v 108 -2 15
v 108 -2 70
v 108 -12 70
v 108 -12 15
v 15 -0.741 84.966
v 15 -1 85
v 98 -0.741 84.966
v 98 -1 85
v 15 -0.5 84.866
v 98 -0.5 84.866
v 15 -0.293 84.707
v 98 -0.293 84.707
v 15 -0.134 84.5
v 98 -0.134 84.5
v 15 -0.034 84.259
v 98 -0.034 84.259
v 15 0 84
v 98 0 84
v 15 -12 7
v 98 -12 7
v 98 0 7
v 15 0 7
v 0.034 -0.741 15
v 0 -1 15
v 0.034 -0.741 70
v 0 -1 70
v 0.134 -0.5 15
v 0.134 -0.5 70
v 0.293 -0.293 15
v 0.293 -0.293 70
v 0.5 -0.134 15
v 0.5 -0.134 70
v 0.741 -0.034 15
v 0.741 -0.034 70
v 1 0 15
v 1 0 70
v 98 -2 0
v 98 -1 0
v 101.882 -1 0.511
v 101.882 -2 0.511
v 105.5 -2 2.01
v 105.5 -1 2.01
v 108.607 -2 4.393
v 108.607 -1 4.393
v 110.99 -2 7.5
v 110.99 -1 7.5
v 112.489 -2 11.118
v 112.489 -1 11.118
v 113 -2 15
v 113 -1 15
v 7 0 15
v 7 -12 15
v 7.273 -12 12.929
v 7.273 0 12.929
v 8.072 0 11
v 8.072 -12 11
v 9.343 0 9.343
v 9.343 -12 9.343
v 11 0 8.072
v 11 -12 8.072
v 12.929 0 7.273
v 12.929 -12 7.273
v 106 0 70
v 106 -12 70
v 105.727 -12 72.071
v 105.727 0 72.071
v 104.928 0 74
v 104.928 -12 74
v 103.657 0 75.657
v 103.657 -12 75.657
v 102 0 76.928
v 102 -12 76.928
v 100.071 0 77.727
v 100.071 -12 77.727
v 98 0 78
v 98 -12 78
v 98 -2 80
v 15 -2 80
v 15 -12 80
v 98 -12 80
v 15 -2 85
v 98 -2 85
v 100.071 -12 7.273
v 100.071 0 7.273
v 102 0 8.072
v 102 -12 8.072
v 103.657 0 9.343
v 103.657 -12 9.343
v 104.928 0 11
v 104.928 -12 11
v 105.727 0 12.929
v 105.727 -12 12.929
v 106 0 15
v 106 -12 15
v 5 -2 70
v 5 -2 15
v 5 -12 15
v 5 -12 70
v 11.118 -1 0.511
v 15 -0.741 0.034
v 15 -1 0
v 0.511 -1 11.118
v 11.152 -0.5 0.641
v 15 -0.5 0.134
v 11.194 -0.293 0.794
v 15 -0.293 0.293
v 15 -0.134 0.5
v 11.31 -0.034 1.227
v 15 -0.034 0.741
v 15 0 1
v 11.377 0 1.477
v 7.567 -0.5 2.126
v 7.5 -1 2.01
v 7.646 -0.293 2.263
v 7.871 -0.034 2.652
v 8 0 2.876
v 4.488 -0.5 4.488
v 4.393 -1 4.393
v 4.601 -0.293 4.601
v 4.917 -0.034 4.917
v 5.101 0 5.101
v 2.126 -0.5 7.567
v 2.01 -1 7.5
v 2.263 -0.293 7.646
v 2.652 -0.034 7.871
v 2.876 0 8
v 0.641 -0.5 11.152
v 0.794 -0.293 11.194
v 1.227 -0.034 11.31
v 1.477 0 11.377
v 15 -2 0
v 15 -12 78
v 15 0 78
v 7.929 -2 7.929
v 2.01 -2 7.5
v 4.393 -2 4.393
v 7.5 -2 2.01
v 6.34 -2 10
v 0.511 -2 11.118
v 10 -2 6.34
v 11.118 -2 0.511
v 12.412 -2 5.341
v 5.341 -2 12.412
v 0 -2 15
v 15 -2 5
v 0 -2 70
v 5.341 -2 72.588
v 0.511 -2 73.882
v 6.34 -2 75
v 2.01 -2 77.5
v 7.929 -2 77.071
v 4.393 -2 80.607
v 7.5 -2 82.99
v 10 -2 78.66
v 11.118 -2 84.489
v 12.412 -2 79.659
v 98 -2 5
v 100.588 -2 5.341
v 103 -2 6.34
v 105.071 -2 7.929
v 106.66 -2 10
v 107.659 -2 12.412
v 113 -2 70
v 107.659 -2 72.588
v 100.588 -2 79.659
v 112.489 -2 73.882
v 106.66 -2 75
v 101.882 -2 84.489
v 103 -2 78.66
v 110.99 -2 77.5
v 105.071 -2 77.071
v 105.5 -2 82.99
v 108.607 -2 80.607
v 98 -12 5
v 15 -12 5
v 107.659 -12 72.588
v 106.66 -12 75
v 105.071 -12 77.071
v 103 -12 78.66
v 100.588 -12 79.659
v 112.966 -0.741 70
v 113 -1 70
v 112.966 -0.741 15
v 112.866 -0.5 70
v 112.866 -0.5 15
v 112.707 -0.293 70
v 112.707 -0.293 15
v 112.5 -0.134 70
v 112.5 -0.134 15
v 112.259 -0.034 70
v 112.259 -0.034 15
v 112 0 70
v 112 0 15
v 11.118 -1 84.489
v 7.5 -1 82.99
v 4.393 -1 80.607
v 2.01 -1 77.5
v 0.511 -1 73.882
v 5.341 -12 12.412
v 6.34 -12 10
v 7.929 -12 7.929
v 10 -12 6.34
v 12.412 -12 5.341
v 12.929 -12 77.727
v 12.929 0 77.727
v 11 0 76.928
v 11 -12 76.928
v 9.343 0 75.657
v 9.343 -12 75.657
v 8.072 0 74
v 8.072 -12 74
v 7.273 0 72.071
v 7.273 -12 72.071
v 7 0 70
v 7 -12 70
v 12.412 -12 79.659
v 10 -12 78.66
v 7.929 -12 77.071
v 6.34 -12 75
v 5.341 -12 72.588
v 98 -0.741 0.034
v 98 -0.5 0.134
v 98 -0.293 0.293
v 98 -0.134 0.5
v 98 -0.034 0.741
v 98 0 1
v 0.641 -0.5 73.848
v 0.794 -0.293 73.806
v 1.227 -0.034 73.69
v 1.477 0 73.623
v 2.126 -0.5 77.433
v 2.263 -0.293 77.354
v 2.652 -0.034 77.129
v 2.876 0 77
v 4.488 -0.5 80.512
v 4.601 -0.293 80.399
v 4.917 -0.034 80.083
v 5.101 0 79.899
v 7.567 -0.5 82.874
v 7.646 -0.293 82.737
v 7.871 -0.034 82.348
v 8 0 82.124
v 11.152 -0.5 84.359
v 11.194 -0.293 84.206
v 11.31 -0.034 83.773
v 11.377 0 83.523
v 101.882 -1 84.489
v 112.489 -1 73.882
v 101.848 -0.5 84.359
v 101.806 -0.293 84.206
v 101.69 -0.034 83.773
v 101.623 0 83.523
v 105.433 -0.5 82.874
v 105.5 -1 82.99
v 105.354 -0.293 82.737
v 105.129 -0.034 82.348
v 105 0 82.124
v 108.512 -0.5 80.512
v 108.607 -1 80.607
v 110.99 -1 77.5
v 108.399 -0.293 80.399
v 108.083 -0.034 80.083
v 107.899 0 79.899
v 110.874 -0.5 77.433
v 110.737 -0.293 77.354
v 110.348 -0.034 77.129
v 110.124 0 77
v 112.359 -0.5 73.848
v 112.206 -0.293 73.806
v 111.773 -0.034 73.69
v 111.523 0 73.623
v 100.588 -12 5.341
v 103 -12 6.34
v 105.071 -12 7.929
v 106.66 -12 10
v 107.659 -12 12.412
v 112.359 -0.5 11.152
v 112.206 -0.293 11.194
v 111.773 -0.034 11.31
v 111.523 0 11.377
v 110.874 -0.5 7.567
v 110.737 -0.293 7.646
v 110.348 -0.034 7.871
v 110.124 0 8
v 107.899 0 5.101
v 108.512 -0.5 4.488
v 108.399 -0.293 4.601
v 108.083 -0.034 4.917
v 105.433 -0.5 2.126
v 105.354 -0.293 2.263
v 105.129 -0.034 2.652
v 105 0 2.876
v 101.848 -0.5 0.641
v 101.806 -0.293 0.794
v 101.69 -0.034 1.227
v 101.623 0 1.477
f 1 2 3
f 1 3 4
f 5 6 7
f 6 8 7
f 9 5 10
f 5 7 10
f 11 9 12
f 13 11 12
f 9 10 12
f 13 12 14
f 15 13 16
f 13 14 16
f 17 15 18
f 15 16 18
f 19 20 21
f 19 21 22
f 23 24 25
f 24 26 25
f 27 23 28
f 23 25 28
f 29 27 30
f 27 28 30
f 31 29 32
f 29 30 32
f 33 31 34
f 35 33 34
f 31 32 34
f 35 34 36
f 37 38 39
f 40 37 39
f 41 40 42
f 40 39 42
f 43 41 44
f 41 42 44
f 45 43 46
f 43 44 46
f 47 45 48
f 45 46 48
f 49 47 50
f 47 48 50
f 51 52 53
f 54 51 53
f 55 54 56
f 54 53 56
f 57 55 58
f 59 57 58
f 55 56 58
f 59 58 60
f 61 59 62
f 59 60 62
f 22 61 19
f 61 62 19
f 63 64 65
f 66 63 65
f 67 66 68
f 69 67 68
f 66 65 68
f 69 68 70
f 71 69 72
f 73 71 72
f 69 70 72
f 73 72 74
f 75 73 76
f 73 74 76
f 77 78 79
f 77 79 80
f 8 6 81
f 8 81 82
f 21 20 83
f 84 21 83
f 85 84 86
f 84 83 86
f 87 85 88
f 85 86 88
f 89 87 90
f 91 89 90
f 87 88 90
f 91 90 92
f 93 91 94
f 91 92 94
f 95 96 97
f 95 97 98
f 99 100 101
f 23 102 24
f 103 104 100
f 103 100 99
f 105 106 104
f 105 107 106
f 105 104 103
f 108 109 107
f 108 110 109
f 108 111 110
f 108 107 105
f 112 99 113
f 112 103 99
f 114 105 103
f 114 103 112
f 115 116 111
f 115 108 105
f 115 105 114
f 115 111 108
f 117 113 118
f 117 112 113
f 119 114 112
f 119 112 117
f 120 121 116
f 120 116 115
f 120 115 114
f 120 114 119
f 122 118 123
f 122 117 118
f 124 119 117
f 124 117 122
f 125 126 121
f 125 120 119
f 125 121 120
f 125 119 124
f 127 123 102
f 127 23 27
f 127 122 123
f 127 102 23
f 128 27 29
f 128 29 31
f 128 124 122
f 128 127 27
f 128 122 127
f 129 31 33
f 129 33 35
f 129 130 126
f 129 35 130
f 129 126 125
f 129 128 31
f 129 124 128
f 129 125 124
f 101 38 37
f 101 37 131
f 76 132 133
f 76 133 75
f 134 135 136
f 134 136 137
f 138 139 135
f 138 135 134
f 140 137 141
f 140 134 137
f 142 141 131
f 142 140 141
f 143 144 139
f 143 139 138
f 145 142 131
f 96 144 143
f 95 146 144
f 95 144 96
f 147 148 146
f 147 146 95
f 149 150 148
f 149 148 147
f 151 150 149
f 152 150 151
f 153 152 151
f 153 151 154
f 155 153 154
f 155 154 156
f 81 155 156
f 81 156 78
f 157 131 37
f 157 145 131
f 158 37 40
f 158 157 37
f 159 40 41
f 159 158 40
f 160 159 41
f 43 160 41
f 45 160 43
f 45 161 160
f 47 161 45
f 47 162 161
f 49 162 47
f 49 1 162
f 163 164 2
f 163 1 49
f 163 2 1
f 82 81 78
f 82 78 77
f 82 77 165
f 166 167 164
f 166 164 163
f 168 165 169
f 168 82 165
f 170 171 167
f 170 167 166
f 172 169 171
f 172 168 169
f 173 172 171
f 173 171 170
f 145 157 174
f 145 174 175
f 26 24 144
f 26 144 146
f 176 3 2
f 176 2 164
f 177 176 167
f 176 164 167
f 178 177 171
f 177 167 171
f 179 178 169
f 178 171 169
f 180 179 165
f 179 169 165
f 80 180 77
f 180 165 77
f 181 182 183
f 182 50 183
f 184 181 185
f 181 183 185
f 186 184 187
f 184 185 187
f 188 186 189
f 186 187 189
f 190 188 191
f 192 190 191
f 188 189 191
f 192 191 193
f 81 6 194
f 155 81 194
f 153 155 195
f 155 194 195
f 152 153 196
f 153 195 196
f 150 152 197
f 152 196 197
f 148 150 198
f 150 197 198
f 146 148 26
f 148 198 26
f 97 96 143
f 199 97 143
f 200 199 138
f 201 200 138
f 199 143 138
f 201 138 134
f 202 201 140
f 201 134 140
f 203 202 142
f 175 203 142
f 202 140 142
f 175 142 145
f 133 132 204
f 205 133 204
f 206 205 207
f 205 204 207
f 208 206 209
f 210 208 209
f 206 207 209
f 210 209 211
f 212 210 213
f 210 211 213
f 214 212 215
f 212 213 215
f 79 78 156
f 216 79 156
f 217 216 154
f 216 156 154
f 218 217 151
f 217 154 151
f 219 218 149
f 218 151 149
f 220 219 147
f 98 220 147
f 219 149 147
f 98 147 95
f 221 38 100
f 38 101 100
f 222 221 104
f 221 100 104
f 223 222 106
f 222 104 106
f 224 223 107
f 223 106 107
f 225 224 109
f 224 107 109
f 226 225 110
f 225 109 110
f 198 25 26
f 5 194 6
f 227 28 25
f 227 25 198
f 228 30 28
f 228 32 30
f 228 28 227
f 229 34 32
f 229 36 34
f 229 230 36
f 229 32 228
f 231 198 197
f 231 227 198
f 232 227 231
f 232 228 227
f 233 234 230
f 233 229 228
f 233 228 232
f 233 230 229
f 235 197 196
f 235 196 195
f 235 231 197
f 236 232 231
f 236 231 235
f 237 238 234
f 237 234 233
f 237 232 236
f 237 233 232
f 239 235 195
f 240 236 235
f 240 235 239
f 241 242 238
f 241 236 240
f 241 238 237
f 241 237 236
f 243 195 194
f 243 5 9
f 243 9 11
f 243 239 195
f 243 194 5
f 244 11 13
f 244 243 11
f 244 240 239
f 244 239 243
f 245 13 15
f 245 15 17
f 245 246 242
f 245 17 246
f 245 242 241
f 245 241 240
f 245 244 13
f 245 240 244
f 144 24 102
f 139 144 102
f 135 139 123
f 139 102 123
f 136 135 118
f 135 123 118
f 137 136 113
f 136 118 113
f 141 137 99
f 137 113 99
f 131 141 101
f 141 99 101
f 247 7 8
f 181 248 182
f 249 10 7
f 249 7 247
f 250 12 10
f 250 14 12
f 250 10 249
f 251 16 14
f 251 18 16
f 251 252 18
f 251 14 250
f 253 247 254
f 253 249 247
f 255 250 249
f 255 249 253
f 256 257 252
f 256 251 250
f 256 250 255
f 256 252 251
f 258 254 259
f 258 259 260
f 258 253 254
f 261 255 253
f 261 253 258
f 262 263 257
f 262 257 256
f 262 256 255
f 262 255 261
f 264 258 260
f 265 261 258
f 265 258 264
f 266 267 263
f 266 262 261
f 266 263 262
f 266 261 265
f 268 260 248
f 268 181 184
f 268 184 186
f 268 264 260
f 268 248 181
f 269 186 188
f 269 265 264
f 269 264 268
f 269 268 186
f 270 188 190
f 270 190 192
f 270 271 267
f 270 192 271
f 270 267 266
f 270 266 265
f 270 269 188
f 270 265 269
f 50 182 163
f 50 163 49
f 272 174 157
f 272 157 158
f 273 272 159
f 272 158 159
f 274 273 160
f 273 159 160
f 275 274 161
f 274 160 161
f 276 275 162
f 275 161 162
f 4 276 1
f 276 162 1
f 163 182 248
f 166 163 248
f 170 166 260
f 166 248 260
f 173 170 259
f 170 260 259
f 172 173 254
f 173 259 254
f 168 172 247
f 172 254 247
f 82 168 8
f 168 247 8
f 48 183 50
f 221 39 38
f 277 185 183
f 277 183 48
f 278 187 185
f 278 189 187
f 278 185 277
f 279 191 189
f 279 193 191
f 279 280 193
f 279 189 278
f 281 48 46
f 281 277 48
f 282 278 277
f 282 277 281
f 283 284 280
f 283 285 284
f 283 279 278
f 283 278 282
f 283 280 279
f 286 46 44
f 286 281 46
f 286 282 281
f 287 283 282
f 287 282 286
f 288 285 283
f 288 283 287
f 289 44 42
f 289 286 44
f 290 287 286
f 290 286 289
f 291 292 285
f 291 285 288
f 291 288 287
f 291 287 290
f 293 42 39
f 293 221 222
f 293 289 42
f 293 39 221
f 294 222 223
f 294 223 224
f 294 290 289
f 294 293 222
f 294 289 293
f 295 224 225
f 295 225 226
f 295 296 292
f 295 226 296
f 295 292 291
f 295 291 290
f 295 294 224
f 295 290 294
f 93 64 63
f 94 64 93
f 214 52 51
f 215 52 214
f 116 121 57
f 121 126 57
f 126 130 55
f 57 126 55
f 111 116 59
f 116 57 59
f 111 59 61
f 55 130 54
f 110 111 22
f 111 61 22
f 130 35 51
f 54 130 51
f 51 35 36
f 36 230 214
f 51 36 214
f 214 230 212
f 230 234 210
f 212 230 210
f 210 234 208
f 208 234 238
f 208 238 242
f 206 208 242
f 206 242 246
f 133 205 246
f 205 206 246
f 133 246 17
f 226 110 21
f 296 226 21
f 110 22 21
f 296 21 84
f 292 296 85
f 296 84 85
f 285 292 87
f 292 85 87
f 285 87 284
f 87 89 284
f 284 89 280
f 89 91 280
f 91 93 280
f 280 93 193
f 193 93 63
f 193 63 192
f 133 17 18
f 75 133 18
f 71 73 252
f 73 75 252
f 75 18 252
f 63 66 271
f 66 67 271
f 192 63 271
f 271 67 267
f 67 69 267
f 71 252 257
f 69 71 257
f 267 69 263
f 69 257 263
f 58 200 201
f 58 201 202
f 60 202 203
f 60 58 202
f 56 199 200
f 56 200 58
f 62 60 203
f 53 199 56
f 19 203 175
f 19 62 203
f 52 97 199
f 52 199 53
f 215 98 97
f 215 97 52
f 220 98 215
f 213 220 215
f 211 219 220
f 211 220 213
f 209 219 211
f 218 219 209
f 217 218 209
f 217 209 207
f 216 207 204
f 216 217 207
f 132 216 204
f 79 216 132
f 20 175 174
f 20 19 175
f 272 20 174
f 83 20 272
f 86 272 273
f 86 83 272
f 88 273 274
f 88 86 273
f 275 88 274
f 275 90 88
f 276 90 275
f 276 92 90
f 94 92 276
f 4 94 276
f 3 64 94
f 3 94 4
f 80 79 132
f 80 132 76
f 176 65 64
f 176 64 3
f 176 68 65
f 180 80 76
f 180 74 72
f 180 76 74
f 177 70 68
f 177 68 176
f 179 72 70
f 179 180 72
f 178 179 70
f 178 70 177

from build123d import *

# Parameters (mm, degrees)
PAD_DEPTH    = 2
PAD001_DEPTH = 10
POCKET_DEPTH = 12.001
FILLET_R     = 1


with BuildPart() as part:
    # Sketch → Pad (new body)
    with BuildSketch(Plane.XZ):
        with BuildLine():
            ThreePointArc((15, 85), (4.393398, 80.606602), (0, 70))
            Line((0, 15), (0, 70))
            ThreePointArc((0, 15), (4.393398, 4.393398), (15, 0))
            Line((98, 0), (15, 0))
            ThreePointArc((98, 0), (108.606602, 4.393398), (113, 15))
            Line((113, 70), (113, 15))
            ThreePointArc((113, 70), (108.606602, 80.606602), (98, 85))
            Line((15, 85), (98, 85))
        make_face()
    extrude(amount=PAD_DEPTH)

    # Sketch001 (on Face10 of Pad) → Pad001 (join)
    with BuildSketch(Plane.XZ.offset(2)):
        with BuildLine():
            ThreePointArc((15, 80), (7.928932, 77.071068), (5, 70))
            Line((5, 15), (5, 70))
            ThreePointArc((5, 15), (7.928932, 7.928932), (15, 5))
            Line((98, 5), (15, 5))
            ThreePointArc((98, 5), (105.071068, 7.928932), (108, 15))
            Line((108, 70), (108, 15))
            ThreePointArc((108, 70), (105.071068, 77.071068), (98, 80))
            Line((15, 80), (98, 80))
        make_face()
    extrude(amount=PAD001_DEPTH)

    # Sketch002 (on Face19 of Pad001) → Pocket (cut, through all)
    with BuildSketch(Plane.XZ.offset(12)):
        with BuildLine():
            ThreePointArc((15, 78), (9.343146, 75.656854), (7, 70))
            Line((7, 15), (7, 70))
            ThreePointArc((7, 15), (9.343146, 9.343146), (15, 7))
            Line((98, 7), (15, 7))
            ThreePointArc((98, 7), (103.656854, 9.343146), (106, 15))
            Line((106, 70), (106, 15))
            ThreePointArc((106, 70), (103.656854, 75.656854), (98, 78))
            Line((15, 78), (98, 78))
        make_face()
    extrude(amount=-POCKET_DEPTH, mode=Mode.SUBTRACT)

    # Fillet
    fillet_edges = [part.edges().sort_by_distance(p)[0] for p in [
        (56.5, 0, 85),
    ]]
    fillet(fillet_edges, radius=FILLET_R)


solid = part.part
